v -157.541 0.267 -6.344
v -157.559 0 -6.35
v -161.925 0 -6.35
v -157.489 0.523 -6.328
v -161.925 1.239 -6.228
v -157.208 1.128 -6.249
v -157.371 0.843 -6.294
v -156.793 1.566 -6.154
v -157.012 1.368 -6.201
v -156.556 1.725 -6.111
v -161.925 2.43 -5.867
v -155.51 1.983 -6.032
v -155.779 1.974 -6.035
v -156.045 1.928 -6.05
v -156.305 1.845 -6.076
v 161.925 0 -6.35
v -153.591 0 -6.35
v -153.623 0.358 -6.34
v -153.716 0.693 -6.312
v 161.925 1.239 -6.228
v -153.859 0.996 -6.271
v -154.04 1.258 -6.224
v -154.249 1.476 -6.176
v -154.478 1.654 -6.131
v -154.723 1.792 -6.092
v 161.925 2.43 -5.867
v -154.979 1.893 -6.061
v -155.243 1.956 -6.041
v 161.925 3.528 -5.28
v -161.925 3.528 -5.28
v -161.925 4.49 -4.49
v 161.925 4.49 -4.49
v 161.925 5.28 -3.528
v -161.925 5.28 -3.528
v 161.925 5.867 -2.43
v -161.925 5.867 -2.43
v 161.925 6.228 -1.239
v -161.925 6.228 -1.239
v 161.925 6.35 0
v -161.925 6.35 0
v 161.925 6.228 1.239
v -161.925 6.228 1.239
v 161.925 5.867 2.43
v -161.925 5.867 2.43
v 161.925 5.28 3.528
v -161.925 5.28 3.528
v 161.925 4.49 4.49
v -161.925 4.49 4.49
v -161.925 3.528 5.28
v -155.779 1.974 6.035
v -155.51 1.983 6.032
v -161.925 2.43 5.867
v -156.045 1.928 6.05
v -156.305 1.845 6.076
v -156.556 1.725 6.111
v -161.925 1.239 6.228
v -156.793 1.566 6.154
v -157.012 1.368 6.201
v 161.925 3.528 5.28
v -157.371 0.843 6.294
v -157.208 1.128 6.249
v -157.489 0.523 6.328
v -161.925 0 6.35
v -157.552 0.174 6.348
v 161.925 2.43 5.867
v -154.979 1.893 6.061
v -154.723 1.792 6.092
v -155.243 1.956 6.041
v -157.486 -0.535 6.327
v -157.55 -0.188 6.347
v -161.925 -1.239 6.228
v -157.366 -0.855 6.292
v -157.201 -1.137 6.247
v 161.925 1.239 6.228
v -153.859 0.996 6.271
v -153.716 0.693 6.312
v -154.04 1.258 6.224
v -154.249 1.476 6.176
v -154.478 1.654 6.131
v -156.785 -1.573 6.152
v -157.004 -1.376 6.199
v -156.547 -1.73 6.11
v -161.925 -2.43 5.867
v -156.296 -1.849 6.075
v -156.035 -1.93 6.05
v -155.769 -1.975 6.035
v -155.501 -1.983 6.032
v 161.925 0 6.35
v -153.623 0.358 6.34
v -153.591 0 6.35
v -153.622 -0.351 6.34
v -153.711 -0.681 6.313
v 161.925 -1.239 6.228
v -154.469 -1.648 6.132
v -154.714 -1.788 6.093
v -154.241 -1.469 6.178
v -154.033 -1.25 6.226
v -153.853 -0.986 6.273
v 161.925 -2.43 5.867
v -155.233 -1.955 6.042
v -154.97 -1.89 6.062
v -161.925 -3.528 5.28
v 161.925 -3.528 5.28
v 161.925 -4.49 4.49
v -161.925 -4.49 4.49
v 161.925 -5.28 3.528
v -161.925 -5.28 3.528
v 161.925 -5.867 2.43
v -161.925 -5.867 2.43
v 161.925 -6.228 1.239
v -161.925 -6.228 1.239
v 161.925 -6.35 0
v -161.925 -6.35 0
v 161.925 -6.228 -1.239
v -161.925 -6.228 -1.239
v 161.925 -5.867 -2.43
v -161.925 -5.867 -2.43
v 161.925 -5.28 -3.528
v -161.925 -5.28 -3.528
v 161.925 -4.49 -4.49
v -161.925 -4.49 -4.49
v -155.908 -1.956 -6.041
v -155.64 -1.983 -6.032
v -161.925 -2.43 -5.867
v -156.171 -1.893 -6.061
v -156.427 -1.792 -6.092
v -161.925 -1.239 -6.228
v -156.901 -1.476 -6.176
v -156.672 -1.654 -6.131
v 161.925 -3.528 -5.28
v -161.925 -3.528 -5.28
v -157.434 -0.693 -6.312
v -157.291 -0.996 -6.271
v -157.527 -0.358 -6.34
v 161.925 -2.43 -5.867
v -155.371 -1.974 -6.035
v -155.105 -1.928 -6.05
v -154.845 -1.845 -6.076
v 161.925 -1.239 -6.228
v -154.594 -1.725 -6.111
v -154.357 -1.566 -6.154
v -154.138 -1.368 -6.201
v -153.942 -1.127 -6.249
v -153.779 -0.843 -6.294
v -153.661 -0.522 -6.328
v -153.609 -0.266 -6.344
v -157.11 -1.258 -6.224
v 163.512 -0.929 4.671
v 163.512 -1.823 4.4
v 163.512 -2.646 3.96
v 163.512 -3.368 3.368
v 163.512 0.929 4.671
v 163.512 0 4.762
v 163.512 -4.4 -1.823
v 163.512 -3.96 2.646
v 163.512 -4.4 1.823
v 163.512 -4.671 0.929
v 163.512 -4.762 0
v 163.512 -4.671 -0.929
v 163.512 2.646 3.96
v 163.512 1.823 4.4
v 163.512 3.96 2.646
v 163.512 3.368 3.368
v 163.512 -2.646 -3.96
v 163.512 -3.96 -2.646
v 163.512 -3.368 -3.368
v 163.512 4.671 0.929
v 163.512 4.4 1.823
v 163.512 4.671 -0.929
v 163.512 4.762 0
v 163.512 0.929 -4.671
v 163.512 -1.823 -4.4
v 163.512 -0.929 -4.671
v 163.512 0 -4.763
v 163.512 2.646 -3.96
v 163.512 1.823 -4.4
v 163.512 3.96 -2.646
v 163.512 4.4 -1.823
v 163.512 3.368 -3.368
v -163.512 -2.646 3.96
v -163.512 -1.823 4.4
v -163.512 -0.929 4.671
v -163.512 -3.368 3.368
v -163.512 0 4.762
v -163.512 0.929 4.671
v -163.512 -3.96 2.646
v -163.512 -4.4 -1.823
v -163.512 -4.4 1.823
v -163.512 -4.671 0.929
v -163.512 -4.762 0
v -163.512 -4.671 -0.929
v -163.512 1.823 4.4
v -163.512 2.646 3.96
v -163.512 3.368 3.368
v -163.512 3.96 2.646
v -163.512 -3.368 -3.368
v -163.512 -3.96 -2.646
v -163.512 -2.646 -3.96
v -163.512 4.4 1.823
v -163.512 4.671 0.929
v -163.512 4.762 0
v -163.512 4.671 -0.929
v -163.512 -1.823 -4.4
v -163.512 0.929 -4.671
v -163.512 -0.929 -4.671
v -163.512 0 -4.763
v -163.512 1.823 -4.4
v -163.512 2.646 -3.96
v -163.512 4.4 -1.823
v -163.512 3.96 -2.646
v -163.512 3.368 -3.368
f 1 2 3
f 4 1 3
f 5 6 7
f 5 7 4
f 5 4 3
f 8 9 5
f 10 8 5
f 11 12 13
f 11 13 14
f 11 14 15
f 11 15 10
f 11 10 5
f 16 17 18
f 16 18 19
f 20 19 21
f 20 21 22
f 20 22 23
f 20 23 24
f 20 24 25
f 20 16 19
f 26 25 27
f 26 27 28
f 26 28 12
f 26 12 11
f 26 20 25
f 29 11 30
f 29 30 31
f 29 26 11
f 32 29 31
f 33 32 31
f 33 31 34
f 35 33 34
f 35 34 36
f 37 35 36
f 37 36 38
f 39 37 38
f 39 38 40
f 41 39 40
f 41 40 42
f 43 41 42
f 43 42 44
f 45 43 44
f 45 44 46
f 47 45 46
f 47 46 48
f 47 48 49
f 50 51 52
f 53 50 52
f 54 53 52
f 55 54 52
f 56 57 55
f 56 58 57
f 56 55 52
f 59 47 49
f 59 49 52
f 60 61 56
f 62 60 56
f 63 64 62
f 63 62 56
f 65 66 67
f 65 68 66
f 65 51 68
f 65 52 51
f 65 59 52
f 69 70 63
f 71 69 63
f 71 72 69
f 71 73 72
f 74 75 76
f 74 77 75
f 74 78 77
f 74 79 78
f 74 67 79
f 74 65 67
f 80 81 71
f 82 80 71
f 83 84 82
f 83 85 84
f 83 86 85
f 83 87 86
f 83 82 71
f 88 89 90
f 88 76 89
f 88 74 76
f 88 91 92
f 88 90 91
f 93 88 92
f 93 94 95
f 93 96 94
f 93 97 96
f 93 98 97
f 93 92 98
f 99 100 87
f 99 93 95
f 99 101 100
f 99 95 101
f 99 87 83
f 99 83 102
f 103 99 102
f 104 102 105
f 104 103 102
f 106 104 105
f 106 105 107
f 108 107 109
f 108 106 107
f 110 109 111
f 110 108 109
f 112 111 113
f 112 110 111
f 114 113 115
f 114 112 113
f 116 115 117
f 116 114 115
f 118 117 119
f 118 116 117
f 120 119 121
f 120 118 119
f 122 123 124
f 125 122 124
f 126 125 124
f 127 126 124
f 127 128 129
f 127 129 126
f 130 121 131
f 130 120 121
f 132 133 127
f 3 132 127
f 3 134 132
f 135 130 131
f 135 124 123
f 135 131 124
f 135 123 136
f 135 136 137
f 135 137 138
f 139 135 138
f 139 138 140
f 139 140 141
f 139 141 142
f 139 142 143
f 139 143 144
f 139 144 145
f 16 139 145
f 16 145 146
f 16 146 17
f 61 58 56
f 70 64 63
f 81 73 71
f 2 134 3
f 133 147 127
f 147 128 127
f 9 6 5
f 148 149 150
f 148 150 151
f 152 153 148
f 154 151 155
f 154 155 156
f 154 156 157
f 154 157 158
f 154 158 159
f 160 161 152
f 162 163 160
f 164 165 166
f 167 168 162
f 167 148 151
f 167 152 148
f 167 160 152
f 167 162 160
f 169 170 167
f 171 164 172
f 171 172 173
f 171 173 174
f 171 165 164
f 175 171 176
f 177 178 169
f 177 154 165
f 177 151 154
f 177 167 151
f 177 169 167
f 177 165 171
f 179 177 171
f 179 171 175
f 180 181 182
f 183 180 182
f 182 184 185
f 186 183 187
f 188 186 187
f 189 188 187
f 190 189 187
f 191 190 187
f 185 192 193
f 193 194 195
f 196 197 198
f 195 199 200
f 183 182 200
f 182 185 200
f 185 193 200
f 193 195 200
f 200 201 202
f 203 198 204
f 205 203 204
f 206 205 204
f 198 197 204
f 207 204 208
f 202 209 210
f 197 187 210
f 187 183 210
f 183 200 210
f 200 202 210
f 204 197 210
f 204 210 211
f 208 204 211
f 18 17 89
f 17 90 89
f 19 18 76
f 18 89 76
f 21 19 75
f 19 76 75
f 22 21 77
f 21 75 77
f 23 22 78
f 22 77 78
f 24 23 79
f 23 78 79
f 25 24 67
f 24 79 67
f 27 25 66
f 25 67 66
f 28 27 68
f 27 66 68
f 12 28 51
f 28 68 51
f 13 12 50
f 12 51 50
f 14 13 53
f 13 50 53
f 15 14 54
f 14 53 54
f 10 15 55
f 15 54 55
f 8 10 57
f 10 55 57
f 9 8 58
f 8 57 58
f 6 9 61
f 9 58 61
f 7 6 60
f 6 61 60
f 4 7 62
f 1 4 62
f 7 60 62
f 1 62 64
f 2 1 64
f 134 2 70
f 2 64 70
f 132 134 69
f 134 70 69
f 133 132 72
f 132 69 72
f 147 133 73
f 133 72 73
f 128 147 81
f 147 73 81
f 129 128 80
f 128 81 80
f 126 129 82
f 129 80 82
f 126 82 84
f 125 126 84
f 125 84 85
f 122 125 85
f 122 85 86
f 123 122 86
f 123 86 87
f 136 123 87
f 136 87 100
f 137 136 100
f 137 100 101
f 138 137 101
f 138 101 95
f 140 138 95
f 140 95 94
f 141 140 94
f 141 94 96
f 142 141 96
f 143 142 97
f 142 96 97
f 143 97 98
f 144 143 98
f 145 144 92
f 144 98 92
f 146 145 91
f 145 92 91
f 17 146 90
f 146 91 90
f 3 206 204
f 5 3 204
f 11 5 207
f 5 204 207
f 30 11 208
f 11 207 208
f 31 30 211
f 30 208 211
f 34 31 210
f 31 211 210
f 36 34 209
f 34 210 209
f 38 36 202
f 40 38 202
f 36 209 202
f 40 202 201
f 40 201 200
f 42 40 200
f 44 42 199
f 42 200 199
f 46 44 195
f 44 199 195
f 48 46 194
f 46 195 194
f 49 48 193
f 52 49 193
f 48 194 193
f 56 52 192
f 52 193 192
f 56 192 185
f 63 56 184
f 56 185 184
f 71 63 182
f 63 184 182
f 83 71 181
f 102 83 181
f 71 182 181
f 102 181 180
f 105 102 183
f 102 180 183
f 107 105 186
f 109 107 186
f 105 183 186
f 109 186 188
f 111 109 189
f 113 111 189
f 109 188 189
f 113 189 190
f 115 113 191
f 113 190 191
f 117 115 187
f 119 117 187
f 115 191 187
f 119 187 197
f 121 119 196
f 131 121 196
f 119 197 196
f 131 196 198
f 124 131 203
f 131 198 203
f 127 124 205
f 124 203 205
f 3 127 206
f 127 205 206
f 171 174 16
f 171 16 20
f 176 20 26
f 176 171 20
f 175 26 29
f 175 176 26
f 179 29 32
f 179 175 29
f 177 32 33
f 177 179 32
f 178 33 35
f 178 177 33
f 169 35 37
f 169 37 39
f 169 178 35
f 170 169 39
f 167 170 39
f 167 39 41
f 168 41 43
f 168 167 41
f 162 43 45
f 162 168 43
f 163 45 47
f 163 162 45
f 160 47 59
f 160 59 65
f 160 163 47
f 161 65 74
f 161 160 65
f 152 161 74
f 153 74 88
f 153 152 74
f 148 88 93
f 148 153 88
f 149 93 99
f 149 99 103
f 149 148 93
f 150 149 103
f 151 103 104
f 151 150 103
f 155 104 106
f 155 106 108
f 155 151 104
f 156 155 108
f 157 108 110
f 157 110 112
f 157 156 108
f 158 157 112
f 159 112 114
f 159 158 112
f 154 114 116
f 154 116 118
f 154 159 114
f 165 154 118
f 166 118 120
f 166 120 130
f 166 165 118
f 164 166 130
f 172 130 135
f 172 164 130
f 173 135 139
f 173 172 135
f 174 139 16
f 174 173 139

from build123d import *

# Parameters (mm, degrees)
SKETCH1_R               = 6.35
BOSS_EXTRUDE1_DEPTH     = 163.5125
CHAMFER1_SIZE           = 1.5875
SKETCH2_R               = 1.984375
CUT_EXTRUDE1_DEPTH      = 7.35
CUT_EXTRUDE1_DEPTH_BACK = 7.35


with BuildPart() as part:
    # Sketch1 → Boss-Extrude1 (new body, symmetric)
    with BuildSketch(Plane(origin=(0, 0, 0), x_dir=(0, 0, -1), z_dir=(1, 0, 0))):
        Circle(SKETCH1_R)
    extrude(amount=BOSS_EXTRUDE1_DEPTH, both=True)

    # Chamfer1
    chamfer1_edges = [part.edges().sort_by_distance(p)[0] for p in [
        (-163.5125, 0, 6.35),
        (163.5125, 0, 6.35),
    ]]
    chamfer(chamfer1_edges, length=CHAMFER1_SIZE)

    # Sketch2 → Cut-Extrude1 (cut, two sides)
    with BuildSketch(Plane.XY) as cut_extrude1_sk:
        with Locations((-155.575, 0)):
            Circle(SKETCH2_R)
    extrude(amount=CUT_EXTRUDE1_DEPTH, mode=Mode.SUBTRACT)
    extrude(cut_extrude1_sk.sketch, amount=-CUT_EXTRUDE1_DEPTH_BACK, mode=Mode.SUBTRACT)


solid = part.part
